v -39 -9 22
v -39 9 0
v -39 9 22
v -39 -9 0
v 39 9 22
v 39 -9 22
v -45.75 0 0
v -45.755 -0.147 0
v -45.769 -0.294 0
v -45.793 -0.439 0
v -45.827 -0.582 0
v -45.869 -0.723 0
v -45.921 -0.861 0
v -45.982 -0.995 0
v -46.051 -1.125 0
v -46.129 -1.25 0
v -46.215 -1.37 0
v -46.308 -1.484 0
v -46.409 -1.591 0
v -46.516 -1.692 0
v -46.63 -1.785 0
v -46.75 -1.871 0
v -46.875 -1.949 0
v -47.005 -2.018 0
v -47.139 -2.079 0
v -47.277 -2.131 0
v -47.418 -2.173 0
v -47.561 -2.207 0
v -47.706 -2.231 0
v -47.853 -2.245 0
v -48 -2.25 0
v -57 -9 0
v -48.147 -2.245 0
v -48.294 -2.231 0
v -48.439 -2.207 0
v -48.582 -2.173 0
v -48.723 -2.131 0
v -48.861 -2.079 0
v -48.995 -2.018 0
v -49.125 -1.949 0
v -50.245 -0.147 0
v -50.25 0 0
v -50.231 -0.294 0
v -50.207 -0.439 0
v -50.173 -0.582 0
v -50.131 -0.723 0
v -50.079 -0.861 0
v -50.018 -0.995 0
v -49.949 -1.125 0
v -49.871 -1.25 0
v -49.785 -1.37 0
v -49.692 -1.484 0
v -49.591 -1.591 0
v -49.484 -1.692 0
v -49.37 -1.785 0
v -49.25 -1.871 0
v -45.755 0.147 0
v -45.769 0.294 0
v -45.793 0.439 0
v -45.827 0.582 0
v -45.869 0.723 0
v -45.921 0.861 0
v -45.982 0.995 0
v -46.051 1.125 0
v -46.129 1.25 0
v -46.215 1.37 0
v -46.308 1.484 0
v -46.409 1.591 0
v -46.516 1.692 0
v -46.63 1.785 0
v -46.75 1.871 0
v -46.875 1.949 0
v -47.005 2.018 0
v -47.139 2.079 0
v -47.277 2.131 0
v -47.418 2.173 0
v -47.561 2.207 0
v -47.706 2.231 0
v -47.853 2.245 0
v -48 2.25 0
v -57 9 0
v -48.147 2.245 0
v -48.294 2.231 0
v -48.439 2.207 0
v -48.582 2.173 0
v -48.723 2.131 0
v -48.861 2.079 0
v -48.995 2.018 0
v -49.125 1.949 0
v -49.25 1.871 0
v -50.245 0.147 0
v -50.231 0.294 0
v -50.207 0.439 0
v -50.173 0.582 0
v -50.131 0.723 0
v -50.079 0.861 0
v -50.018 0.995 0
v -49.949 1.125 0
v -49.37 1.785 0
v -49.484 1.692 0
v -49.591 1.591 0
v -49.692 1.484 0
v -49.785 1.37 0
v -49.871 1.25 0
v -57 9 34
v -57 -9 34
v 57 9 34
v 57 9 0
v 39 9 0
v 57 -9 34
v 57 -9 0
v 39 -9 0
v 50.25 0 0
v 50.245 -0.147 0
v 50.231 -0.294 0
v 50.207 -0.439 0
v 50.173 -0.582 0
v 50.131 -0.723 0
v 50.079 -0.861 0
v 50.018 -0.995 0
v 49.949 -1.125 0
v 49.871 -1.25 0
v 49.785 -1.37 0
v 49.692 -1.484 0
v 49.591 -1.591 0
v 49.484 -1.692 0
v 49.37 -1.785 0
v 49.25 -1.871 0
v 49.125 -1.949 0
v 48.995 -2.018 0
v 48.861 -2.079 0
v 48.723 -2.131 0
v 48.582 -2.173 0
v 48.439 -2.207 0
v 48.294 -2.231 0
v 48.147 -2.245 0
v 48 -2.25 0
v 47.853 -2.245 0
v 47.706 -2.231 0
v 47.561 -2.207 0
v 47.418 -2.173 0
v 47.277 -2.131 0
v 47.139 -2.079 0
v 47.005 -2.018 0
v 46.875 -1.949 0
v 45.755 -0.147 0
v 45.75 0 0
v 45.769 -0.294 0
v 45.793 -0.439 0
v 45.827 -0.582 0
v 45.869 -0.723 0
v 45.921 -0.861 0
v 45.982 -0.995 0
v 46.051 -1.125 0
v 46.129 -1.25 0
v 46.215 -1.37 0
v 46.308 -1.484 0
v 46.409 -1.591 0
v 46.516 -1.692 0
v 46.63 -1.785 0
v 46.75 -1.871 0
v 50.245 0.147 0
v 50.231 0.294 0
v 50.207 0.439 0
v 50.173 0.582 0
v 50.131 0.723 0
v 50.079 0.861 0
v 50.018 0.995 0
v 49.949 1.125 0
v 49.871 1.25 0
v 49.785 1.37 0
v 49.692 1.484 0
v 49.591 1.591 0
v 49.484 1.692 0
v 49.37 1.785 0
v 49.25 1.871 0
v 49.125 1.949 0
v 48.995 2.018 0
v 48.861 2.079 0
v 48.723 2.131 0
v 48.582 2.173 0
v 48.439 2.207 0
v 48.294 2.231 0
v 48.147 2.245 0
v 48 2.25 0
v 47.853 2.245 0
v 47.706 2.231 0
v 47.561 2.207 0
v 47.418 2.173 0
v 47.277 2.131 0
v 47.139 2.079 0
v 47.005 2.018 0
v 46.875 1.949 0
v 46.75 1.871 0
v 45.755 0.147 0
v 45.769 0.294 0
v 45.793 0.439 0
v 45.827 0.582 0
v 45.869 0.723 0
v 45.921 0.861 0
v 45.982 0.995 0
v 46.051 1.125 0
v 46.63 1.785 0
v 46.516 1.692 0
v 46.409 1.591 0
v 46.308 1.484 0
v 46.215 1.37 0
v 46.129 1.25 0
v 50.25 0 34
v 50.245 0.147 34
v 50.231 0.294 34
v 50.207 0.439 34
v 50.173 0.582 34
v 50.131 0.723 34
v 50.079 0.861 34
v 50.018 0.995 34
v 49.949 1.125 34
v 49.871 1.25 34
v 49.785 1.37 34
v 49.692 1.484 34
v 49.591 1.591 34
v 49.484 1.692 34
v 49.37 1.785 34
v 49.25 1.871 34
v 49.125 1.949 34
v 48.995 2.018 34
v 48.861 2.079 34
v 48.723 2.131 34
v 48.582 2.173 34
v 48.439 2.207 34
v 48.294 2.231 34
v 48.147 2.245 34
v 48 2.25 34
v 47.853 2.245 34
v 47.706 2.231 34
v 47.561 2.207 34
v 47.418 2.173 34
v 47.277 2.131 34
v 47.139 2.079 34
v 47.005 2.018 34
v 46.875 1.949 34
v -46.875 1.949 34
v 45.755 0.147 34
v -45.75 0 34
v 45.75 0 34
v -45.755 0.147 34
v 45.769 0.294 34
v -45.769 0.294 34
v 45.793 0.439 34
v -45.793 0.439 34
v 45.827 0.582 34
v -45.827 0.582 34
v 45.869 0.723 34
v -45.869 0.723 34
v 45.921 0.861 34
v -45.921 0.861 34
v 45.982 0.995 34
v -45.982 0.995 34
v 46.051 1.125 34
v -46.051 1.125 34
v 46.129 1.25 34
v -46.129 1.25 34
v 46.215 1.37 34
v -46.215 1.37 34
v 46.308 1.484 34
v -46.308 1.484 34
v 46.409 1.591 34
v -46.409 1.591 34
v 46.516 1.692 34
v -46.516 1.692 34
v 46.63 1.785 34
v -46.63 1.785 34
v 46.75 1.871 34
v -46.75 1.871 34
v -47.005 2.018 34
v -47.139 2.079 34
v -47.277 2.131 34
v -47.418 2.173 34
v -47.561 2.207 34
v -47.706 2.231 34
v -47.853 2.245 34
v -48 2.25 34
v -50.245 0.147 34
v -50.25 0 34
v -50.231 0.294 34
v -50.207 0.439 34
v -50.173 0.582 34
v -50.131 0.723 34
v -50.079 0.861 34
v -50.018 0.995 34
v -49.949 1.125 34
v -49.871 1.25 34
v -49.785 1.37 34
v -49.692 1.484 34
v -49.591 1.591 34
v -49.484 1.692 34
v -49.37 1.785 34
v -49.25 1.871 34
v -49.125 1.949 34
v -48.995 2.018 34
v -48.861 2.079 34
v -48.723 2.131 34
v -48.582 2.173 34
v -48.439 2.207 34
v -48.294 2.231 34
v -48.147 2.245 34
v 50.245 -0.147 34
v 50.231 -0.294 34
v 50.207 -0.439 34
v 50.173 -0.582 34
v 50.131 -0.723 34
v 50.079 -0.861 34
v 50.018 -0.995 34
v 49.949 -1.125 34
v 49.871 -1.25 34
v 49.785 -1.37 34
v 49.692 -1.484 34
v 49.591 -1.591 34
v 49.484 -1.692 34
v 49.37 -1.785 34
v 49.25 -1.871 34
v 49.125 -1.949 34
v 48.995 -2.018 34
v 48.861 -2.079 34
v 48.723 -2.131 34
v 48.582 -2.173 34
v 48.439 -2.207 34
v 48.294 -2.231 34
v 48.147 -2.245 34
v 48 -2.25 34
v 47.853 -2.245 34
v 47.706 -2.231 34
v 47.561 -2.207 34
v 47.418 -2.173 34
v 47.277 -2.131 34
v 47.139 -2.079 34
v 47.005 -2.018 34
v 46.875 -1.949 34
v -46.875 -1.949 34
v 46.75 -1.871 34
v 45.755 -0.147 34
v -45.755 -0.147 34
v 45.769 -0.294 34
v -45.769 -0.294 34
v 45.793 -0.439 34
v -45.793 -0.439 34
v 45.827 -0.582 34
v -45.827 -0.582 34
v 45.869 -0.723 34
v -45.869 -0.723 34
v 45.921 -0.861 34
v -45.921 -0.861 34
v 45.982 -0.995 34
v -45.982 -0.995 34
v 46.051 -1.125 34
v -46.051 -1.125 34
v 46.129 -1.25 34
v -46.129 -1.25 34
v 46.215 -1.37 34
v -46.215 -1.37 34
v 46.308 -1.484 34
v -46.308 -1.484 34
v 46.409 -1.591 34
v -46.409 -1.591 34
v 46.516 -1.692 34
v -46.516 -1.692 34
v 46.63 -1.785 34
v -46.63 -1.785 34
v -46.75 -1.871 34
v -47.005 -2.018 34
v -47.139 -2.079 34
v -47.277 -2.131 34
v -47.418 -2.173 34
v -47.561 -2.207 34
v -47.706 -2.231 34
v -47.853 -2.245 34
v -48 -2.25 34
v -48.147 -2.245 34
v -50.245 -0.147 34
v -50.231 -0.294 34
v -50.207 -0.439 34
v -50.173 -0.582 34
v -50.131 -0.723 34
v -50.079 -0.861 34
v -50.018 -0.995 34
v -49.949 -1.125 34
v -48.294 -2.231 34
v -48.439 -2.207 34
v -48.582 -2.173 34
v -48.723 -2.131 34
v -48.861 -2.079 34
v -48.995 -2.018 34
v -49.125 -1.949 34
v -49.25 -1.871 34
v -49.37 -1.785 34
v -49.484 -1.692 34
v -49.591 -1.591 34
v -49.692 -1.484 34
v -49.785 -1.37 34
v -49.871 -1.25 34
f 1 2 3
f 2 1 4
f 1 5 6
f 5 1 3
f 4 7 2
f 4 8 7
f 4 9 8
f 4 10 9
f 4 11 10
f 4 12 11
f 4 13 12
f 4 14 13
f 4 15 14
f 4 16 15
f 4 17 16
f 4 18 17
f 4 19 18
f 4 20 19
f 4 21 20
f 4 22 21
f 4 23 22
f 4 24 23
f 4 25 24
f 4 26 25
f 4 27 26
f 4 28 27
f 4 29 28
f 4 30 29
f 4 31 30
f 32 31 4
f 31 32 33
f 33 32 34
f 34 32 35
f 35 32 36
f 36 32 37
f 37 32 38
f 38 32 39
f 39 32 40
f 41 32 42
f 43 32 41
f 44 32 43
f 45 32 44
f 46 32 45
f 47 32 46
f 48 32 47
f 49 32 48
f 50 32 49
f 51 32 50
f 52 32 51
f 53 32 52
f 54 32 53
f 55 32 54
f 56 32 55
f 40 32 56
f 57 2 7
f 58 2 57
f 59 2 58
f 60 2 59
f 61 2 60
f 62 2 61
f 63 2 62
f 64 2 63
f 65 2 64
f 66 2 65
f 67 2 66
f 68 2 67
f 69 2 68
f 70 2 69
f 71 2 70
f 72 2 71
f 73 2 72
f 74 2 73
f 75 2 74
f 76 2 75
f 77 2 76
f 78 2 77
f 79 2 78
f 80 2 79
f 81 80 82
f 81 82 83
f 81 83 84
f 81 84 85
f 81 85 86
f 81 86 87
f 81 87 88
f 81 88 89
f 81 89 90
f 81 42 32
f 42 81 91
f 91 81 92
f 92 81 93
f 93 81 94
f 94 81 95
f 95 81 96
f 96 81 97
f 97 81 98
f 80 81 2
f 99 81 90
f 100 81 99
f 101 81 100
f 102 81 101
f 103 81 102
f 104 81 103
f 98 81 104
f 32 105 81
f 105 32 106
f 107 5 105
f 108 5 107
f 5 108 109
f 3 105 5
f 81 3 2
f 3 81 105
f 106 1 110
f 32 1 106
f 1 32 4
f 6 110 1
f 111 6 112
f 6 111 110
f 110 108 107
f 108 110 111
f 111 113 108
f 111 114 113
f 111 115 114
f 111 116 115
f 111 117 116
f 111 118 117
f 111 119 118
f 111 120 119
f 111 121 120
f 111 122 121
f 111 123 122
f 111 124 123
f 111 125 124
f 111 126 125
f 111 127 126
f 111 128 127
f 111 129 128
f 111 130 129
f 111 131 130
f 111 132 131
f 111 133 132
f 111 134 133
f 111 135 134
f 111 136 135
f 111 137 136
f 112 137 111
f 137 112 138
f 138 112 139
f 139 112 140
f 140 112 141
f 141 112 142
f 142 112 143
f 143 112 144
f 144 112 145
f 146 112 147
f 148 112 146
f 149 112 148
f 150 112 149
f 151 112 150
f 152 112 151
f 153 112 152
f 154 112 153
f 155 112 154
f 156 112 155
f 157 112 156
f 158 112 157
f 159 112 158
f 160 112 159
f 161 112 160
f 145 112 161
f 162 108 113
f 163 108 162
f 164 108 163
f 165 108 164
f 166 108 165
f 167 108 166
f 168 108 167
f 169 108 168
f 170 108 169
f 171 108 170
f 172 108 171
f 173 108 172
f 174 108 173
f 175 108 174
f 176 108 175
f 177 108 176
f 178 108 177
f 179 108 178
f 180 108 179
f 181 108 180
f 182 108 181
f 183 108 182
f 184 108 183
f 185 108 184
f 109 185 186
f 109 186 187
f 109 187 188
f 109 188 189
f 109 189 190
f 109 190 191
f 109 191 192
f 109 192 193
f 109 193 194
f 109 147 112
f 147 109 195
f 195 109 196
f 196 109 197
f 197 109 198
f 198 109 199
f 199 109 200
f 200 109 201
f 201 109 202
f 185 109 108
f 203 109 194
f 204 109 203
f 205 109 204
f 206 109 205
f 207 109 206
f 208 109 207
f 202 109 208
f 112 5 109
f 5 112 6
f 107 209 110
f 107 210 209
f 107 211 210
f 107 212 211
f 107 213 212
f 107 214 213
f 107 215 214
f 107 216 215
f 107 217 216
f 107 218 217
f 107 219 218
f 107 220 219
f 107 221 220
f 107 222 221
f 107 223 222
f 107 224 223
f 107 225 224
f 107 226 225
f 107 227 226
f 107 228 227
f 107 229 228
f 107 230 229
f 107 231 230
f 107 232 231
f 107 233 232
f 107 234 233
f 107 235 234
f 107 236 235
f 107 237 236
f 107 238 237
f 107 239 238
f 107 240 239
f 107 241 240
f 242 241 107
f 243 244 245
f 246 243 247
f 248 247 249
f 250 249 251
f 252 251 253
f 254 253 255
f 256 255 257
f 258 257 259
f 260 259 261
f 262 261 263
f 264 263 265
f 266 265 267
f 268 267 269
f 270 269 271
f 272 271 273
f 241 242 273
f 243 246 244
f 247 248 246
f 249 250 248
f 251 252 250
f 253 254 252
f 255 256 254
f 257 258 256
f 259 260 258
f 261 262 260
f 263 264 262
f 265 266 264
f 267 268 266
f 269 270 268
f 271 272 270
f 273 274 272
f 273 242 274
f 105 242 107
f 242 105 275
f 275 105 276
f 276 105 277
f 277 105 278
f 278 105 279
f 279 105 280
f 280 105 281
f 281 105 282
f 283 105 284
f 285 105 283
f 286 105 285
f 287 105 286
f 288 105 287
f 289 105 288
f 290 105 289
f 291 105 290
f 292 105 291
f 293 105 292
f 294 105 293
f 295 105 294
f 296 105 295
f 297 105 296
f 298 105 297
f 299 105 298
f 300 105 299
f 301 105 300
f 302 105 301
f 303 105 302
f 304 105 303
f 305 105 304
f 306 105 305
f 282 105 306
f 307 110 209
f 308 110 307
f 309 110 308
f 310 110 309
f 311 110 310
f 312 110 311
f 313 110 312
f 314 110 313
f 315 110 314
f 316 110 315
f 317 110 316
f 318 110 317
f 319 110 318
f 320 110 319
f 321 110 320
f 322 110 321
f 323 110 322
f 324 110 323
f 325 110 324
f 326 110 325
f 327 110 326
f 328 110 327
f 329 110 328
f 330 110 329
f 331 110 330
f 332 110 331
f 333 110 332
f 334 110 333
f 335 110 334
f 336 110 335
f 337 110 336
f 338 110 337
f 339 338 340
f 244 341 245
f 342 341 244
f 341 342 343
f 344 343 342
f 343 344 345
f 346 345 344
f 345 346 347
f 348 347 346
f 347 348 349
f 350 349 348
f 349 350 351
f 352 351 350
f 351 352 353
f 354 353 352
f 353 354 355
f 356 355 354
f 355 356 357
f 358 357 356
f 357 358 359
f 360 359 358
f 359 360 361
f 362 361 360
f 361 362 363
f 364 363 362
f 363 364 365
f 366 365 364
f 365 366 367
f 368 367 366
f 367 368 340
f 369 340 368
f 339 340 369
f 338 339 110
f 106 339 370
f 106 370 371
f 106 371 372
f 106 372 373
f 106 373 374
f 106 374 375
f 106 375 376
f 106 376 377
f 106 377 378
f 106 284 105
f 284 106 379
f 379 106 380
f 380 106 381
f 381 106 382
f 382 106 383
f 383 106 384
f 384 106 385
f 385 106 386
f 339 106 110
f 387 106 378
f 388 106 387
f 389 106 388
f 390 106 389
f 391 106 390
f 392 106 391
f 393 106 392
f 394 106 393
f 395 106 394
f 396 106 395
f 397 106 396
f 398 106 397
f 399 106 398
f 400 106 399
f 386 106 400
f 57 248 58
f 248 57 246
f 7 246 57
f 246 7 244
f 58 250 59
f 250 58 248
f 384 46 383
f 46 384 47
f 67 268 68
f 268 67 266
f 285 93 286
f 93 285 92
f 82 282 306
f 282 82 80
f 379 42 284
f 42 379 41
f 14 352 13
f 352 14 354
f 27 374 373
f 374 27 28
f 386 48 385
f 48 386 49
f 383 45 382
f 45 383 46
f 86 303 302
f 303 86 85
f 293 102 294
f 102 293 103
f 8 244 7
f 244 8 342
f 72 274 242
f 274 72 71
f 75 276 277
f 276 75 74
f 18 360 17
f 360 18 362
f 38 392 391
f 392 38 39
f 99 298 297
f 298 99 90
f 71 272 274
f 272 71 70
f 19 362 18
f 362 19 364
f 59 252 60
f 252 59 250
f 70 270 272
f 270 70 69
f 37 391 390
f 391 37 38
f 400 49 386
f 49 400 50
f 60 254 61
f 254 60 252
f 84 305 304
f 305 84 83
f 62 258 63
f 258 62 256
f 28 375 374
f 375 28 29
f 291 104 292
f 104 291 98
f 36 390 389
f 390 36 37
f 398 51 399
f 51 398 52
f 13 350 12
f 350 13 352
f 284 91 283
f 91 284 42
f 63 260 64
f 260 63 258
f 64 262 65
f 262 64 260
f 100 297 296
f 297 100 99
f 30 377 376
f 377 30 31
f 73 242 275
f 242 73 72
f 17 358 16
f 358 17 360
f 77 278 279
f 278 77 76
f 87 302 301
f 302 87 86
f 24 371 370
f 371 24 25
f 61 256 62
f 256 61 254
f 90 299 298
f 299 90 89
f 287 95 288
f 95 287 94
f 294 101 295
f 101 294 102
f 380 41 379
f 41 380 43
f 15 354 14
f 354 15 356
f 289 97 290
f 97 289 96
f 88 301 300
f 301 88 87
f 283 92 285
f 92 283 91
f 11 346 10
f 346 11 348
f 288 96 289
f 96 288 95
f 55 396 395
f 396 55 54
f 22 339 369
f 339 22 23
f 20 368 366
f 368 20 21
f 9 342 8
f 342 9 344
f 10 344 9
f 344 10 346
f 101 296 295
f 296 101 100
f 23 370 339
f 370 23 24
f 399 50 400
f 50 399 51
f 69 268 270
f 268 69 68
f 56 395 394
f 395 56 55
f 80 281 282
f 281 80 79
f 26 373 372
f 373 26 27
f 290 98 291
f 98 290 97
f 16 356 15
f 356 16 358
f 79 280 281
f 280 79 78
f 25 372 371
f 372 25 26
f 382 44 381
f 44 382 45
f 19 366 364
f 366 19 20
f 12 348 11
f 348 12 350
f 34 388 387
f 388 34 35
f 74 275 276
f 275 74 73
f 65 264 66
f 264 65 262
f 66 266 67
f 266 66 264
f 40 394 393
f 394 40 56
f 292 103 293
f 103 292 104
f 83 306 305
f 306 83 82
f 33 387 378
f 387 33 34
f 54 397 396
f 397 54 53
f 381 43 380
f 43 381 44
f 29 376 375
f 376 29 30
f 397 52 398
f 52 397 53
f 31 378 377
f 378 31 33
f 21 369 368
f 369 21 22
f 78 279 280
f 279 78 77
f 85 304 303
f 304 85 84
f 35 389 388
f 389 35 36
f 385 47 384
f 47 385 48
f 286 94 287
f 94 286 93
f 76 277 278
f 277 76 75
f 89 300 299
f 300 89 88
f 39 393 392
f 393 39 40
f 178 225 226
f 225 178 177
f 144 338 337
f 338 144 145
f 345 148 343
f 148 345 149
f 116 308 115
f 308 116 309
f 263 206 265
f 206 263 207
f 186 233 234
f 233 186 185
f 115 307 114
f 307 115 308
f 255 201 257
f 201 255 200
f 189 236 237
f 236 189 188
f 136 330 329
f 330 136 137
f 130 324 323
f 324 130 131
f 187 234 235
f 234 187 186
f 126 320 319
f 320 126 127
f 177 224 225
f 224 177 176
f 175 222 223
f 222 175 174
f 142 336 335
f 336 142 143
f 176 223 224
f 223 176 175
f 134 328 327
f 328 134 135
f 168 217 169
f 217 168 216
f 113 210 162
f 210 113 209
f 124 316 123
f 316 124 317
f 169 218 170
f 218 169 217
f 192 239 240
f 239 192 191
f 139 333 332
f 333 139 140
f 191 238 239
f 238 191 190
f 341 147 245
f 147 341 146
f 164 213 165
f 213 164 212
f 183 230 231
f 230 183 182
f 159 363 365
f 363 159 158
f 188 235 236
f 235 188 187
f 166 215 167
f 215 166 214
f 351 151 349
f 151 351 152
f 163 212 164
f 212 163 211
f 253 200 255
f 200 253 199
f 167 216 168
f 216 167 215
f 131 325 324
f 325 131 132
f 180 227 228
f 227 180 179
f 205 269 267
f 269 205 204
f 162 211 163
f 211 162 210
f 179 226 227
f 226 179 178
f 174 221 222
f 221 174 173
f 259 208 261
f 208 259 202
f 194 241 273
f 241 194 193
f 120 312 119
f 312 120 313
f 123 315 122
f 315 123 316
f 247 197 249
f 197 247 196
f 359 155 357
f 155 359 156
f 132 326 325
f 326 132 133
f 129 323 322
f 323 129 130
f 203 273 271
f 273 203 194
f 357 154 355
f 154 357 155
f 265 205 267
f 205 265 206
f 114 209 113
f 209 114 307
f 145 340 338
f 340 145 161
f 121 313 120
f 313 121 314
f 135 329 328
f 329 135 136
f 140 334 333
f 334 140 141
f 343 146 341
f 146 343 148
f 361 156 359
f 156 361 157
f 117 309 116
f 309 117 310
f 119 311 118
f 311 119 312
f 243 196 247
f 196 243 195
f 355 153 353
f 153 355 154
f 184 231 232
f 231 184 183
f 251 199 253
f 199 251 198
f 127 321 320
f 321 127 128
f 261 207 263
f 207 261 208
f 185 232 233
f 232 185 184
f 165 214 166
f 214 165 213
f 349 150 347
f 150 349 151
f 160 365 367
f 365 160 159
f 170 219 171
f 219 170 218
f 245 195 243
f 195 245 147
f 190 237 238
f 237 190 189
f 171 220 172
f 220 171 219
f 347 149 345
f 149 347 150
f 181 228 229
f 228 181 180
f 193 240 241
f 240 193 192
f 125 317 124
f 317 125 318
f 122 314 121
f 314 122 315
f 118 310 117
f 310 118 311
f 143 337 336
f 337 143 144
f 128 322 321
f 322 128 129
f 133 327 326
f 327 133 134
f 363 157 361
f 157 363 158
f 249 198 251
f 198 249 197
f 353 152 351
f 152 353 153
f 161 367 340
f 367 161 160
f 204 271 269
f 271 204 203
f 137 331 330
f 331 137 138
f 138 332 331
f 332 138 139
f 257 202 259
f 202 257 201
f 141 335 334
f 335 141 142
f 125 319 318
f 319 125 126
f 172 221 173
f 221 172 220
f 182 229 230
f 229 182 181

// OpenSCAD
// t2-006 bail-style drawer handle
$fn = 96;
centre_distance = 96;
foot_size = 18;
grip_height = 22;      // foot height = underside of grip bar
bar_thickness = 12;
bar_length = 114;
hole_diameter = 4.5;

difference() {
    union() {
        for (s = [-1, 1])
            translate([s * centre_distance / 2 - foot_size / 2, -foot_size / 2, 0])
                cube([foot_size, foot_size, grip_height]);
        translate([-bar_length / 2, -foot_size / 2, grip_height])
            cube([bar_length, foot_size, bar_thickness]);
    }
    for (s = [-1, 1])
        translate([s * centre_distance / 2, 0, -1])
            cylinder(d = hole_diameter, h = grip_height + bar_thickness + 2);
}
